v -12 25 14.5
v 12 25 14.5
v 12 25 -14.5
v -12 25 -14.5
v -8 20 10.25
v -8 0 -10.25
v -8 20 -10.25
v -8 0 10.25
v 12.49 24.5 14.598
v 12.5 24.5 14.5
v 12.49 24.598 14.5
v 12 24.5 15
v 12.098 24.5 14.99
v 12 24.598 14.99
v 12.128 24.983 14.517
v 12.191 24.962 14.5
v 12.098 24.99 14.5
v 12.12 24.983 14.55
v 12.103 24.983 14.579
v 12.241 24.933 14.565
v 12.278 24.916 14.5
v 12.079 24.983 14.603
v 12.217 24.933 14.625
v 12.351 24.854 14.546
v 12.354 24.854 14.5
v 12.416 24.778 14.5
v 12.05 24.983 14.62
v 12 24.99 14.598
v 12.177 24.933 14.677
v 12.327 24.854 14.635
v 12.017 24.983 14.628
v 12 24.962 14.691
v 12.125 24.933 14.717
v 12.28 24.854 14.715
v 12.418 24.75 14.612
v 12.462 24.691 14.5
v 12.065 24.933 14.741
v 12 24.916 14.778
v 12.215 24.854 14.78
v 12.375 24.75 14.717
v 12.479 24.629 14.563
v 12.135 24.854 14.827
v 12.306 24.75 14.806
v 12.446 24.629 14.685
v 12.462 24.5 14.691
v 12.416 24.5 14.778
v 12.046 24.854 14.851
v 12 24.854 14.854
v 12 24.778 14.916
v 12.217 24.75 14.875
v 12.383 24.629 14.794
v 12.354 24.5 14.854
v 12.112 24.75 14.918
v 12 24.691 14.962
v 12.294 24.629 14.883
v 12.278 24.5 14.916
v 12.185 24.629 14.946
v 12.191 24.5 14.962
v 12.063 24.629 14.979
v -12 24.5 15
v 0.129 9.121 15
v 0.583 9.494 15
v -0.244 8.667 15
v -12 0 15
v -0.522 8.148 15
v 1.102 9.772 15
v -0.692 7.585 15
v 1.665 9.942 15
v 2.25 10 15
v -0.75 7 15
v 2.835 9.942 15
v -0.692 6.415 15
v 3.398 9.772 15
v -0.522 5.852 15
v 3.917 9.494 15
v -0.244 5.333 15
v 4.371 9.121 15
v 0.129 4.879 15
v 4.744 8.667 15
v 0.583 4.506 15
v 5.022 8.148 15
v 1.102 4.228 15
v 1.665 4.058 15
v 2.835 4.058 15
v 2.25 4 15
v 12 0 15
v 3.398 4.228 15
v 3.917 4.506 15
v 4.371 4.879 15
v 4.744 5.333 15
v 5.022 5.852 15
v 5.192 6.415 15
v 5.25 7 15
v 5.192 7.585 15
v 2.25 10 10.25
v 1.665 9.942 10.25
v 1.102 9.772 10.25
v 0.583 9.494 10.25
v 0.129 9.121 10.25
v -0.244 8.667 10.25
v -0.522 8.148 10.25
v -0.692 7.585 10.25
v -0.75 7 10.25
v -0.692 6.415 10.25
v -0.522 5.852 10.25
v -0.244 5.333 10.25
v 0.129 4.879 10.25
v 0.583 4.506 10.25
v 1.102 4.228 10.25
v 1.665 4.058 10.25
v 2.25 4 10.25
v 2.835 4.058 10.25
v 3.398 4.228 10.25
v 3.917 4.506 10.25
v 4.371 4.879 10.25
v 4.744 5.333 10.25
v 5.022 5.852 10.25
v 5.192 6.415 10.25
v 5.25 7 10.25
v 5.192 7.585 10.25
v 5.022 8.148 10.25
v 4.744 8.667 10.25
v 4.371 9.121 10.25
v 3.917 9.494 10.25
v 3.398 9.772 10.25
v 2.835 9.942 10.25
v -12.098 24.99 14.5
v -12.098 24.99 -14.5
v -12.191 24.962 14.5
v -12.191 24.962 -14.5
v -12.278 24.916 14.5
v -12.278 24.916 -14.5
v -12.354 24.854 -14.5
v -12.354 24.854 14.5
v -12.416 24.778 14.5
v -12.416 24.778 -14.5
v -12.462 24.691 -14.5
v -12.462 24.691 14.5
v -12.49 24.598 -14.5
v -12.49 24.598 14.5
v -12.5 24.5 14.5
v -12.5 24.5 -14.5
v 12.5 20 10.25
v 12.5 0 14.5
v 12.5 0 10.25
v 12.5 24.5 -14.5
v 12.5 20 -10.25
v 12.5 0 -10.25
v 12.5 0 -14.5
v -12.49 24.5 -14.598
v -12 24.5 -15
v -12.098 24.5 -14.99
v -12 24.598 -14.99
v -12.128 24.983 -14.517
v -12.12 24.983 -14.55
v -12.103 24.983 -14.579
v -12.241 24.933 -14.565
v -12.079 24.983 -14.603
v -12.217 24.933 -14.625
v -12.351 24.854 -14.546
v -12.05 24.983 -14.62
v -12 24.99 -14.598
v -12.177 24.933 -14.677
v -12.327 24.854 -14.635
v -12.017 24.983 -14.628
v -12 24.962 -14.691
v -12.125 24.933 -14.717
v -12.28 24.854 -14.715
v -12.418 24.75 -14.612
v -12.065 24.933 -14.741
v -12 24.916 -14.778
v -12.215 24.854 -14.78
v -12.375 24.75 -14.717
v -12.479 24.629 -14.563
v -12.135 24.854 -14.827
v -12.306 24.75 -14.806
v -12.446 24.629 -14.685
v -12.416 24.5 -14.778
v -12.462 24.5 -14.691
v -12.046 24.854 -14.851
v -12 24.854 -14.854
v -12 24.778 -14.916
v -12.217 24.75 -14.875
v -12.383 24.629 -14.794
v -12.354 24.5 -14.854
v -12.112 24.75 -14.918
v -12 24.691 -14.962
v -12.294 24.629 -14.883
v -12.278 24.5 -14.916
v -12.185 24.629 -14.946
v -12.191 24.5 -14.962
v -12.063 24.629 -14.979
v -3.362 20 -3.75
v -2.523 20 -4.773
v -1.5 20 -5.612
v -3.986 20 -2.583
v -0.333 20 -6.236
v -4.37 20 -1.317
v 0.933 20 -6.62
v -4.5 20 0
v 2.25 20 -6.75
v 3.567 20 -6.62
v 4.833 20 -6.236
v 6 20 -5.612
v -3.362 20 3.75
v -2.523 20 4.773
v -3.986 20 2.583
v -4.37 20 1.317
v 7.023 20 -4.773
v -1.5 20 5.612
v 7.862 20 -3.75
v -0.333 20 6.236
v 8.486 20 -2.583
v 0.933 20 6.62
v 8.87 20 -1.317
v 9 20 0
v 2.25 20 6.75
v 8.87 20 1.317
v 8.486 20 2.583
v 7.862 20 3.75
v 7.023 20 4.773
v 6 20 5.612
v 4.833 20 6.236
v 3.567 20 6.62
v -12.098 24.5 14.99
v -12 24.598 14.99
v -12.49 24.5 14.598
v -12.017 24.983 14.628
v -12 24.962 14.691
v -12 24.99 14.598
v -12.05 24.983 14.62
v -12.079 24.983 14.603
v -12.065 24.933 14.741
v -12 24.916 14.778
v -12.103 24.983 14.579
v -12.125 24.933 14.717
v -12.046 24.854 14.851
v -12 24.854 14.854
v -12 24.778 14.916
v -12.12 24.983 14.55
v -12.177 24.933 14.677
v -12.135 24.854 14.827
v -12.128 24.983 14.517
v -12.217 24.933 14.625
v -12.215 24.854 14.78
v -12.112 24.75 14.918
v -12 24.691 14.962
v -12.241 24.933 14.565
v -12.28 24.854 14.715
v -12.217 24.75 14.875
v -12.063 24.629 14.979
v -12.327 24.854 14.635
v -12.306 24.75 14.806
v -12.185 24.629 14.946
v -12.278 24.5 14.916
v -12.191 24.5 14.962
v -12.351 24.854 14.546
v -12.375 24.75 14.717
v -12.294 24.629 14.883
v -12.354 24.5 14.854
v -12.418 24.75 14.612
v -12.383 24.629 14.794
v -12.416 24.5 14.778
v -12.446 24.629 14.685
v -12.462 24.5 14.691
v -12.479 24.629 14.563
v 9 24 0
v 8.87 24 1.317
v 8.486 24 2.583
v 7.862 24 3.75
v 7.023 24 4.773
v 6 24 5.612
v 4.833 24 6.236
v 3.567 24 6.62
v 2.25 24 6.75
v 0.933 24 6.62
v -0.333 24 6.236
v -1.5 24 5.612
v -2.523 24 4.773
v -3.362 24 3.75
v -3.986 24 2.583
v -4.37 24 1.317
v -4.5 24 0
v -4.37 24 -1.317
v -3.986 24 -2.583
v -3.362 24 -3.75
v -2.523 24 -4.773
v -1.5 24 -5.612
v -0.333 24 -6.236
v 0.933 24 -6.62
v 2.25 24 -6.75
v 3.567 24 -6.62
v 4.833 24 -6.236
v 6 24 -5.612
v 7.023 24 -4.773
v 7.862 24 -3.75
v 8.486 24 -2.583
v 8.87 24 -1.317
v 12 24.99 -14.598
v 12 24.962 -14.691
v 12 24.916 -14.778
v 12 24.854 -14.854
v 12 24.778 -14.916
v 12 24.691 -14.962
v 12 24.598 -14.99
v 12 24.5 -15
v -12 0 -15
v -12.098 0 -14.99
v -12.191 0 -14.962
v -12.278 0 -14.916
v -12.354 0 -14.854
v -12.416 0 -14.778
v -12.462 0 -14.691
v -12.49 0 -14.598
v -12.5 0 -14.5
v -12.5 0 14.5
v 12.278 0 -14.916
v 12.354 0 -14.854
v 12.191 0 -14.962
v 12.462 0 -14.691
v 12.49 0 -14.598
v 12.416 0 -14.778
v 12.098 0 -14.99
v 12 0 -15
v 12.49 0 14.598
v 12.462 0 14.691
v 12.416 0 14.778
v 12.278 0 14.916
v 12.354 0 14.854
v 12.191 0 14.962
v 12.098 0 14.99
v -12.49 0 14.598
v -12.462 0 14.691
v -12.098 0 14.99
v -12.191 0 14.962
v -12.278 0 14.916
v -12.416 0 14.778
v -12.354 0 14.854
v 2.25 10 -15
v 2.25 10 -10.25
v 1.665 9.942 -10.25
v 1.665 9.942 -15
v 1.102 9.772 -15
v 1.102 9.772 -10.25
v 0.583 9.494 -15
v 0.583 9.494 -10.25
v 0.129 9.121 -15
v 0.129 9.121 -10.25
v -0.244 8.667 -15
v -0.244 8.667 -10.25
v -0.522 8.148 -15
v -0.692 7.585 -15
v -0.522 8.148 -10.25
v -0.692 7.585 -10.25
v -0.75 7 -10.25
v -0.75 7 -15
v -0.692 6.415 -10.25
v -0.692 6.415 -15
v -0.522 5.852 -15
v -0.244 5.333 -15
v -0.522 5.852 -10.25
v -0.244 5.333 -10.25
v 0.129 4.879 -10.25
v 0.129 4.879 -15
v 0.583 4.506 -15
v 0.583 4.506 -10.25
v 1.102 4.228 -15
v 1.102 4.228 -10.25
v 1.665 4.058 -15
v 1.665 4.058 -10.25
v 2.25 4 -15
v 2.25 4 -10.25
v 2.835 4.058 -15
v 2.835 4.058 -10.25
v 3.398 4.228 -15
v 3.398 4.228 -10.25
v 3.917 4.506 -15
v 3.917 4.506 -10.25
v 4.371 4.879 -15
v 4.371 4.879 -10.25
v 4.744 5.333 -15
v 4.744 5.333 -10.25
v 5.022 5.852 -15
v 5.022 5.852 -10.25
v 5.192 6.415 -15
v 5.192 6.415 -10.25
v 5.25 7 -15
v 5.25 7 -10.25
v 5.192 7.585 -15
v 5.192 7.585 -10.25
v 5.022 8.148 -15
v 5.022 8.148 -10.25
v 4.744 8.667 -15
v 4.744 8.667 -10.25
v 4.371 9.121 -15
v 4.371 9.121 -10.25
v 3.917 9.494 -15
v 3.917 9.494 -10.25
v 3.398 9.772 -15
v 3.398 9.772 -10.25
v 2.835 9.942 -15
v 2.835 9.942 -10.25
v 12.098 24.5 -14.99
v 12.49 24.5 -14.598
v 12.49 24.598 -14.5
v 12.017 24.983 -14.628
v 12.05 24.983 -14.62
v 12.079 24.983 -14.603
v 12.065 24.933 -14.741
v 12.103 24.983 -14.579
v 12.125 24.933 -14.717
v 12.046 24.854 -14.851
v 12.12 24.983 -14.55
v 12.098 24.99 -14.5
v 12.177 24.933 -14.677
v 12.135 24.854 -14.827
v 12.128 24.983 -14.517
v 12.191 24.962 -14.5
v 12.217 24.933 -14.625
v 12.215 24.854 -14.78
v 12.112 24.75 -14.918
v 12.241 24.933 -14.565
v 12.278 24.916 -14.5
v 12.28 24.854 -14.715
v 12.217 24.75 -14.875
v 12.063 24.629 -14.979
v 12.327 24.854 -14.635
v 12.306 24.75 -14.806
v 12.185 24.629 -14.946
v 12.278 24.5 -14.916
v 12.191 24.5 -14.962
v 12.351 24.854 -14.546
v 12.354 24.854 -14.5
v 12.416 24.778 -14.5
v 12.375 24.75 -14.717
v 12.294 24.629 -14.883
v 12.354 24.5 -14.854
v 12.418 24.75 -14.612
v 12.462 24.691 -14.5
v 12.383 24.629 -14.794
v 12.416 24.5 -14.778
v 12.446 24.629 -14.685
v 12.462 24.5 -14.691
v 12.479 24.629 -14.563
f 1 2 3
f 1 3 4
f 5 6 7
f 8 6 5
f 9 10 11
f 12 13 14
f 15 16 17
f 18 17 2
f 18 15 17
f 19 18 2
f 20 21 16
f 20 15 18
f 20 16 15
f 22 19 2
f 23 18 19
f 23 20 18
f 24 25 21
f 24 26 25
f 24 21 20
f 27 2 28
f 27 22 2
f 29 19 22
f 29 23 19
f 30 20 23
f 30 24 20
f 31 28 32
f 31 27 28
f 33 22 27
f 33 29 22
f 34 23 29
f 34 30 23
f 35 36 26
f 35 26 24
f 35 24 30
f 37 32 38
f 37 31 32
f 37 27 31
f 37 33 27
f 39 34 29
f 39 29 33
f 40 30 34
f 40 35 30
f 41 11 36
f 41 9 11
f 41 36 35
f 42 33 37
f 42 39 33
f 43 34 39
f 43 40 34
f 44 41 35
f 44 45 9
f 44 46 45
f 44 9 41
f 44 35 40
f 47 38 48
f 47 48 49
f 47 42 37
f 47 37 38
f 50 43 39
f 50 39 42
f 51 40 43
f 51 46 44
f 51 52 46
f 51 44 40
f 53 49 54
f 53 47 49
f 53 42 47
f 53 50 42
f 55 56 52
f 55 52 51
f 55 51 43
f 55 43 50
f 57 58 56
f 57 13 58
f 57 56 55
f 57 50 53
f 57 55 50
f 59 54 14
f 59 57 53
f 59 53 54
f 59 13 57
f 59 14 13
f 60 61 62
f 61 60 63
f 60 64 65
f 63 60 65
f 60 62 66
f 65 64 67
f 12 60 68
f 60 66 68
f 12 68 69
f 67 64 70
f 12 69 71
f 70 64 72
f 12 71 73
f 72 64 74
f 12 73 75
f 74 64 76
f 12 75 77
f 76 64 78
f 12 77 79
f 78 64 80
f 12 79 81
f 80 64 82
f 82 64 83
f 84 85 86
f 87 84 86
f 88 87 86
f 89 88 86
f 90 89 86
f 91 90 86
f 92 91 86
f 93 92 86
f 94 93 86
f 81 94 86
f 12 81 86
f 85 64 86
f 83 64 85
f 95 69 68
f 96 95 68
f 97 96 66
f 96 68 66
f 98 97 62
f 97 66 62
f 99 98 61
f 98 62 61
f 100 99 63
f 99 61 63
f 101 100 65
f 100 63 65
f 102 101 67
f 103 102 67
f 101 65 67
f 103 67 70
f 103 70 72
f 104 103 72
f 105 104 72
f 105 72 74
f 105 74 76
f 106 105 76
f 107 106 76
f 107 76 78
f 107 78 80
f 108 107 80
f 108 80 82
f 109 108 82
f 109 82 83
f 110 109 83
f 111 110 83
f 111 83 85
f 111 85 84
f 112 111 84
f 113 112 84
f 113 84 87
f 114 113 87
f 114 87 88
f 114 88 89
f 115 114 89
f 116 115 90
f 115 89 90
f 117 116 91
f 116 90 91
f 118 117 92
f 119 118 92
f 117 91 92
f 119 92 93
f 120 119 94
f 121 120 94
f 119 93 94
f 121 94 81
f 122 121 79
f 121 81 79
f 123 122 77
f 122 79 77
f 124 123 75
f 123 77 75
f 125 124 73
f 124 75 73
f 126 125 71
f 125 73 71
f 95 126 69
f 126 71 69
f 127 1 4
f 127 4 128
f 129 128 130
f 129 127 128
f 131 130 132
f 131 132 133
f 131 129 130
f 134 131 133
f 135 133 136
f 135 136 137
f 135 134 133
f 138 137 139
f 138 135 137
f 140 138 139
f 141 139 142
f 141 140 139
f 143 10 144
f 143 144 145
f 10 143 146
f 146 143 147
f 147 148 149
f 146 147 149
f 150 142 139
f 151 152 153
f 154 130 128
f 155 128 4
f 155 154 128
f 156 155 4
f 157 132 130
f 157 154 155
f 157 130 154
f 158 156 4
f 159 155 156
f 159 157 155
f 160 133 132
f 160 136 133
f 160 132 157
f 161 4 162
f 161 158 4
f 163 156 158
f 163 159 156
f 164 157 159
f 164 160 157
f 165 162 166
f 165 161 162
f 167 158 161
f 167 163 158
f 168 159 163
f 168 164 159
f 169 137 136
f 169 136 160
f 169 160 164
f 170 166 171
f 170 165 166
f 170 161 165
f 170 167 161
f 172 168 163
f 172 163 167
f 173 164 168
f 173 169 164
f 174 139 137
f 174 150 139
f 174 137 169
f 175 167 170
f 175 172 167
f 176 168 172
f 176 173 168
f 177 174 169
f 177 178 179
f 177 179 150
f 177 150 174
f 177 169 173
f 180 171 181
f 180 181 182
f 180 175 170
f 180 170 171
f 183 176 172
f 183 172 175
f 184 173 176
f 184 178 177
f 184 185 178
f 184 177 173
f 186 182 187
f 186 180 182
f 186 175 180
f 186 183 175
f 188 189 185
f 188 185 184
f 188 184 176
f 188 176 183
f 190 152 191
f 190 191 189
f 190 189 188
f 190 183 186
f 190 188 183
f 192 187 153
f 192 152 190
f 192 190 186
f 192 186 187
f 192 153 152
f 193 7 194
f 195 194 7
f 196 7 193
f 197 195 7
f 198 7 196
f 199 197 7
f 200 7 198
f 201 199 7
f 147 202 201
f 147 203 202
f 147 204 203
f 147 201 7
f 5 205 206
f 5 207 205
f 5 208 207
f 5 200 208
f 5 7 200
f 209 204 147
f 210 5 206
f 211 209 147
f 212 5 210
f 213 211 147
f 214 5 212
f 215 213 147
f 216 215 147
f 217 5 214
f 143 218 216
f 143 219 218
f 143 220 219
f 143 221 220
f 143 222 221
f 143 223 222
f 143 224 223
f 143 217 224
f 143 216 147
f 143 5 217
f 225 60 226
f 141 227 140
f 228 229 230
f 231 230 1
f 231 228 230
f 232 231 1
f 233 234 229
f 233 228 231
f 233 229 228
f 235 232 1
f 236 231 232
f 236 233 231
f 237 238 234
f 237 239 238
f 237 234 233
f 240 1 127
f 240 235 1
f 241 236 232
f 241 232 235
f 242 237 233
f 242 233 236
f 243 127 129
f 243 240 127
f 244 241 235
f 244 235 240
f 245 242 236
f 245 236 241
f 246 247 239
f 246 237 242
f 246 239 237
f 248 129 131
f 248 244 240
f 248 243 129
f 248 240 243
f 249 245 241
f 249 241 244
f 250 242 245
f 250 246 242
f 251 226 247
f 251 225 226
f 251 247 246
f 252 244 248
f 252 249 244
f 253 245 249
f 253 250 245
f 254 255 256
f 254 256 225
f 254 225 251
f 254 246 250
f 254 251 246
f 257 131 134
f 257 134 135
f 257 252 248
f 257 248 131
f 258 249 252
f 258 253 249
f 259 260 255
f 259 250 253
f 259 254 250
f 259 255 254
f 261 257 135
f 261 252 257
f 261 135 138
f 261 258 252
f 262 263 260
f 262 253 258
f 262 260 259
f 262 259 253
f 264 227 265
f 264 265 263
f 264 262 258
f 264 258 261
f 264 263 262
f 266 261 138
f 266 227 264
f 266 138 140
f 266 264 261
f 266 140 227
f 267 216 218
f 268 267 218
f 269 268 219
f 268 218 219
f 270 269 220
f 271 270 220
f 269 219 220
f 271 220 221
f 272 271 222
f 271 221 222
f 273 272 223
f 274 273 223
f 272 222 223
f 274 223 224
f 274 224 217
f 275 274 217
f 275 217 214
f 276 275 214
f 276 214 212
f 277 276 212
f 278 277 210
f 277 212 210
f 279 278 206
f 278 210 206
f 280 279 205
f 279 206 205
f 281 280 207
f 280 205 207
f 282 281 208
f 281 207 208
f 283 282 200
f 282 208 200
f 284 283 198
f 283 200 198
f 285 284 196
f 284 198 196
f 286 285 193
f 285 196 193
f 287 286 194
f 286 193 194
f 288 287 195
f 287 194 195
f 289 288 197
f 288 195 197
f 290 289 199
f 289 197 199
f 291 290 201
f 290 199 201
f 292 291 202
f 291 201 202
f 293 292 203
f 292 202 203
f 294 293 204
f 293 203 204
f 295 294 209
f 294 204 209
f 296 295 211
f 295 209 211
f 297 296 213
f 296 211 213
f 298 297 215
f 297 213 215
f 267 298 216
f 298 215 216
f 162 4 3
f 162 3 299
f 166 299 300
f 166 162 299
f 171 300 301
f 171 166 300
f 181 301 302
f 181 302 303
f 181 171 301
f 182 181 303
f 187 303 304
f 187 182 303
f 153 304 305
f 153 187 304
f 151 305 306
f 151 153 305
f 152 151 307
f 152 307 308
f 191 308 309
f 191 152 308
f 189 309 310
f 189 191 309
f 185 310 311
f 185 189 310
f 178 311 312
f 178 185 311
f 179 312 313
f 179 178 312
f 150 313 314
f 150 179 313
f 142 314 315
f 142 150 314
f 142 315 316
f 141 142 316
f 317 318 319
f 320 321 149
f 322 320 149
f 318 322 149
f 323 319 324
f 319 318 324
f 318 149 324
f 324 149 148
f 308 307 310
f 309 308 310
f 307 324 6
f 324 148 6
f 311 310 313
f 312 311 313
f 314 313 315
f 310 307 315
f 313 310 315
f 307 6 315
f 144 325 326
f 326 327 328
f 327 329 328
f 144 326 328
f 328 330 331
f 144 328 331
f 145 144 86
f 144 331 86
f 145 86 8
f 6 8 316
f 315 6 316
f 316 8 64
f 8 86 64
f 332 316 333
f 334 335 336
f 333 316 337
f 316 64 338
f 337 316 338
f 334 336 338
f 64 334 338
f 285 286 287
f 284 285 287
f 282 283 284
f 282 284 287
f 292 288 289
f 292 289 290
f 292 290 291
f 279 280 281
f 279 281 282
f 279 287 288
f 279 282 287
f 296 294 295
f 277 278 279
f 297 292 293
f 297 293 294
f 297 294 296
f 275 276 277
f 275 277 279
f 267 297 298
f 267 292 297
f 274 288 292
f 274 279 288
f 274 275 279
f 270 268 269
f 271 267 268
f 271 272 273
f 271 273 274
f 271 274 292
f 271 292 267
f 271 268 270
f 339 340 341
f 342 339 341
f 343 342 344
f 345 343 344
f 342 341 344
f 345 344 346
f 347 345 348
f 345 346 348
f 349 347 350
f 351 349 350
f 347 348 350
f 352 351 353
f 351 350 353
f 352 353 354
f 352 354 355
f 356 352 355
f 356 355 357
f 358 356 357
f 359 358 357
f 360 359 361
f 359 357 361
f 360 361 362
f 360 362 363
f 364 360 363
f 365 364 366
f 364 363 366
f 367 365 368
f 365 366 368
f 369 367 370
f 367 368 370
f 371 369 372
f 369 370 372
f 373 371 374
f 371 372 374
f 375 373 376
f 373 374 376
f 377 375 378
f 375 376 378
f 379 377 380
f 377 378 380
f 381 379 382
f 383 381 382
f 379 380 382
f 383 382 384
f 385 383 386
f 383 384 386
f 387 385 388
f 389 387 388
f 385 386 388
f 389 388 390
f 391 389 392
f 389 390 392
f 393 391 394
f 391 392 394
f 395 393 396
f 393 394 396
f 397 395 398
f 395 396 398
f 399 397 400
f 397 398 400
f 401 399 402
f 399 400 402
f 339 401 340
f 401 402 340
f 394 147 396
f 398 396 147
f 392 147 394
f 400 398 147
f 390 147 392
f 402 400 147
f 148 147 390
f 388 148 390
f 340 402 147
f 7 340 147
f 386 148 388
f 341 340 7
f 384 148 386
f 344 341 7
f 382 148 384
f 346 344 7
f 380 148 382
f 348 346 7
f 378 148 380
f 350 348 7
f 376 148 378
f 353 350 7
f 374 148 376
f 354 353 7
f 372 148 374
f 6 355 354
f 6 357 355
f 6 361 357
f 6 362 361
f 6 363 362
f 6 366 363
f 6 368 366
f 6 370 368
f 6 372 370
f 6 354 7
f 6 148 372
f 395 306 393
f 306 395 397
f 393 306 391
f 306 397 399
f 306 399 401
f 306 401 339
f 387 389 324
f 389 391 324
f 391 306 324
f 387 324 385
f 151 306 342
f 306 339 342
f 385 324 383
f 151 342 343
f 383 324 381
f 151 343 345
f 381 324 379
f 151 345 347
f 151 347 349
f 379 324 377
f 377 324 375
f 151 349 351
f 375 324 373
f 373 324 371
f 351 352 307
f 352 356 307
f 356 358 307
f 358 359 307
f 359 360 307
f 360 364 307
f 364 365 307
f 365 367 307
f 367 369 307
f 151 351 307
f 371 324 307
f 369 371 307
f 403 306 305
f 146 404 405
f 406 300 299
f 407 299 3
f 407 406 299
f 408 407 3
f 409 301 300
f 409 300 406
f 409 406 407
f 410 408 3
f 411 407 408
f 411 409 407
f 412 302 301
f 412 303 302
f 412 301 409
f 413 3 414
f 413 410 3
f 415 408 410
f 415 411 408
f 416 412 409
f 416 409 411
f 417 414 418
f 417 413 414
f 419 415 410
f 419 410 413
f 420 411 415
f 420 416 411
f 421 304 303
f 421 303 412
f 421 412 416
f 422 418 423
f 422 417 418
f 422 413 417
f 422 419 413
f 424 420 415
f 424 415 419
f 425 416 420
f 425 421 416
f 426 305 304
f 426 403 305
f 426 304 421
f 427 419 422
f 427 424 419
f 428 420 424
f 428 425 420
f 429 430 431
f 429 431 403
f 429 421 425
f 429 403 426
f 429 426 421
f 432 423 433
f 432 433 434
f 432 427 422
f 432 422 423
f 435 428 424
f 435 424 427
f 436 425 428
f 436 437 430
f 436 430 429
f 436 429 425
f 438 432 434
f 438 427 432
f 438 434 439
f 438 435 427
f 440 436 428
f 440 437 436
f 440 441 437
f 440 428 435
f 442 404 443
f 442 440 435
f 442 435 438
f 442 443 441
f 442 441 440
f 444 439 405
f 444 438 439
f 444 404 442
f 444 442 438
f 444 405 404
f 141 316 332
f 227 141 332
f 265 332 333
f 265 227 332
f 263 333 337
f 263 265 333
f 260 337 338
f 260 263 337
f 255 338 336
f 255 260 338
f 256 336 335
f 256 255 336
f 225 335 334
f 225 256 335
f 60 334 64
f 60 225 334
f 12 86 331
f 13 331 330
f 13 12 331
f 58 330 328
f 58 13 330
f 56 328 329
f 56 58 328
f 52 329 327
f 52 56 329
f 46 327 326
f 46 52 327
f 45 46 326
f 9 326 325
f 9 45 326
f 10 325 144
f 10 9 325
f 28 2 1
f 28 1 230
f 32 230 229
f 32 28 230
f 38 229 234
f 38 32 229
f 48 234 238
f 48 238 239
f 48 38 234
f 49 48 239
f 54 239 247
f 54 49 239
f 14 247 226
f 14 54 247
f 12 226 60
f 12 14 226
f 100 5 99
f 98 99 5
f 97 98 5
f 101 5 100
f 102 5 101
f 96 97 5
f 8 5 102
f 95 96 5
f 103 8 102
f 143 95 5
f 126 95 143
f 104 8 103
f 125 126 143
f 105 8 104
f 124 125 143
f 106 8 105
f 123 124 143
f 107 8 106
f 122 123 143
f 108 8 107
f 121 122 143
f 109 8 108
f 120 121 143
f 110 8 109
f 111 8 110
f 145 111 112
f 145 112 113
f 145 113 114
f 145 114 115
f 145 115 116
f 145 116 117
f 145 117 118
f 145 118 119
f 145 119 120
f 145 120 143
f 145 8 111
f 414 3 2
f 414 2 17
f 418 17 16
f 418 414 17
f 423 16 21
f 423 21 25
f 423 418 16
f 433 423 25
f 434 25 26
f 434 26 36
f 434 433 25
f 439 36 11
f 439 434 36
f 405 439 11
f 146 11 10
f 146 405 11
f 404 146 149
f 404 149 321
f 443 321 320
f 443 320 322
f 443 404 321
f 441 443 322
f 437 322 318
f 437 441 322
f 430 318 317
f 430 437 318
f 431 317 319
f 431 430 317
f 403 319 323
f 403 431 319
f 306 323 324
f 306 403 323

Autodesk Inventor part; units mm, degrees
ref_plane "YZ Plane" through (0, 0, 0) normal (1, 0, 0) x (0, 1, 0)
ref_plane "XZ Plane" through (0, 0, 0) normal (0, 1, 0) x (-1, 0, 0)
ref_plane "XY Plane" through (0, 0, 0) normal (0, 0, 1) x (1, 0, 0)
sketch "スケッチ1" plane through (0, 0, 0) normal (0, 1, 0) x (-1, 0, 0)
  line L0 (-12.5, -15) -> (12.5, -15)
  line L1 (12.5, -15) -> (12.5, 15)
  line L2 (12.5, 15) -> (-12.5, 15)
  line L3 (-12.5, 15) -> (-12.5, -15)
  line L4 (-12.5, -15) -> (12.5, 15) construction
  line L5 (12.5, -15) -> (-12.5, 15) construction
  point P0 (0, 0)
  dimension "d0" = 25
  dimension "d1" = 30
extrude "押し出し1" add sketch "スケッチ1" along normal blind 25
sketch "スケッチ2" plane through (0, 0, 0) normal (0, -1, 0) x (1, 0, 0)
  line L0 (12.5, 15) -> (12.5, -15) projected
  line L1 (12.5, -10.25) -> (-8, -10.25)
  line L2 (-8, -10.25) -> (-8, 10.25)
  line L3 (-8, 10.25) -> (12.5, 10.25)
  line L4 (12.5, 10.25) -> (12.5, -10.25)
  line L5 (12.5, -15) -> (-12.5, -15) projected
  point P0 (0, 0)
  point P1 (12.5, 10.25)
  dimension "d4" = 20.5
  dimension "d5" = 20.5
  dimension "d22" = 10.25
extrude "押し出し2" cut sketch "スケッチ2" against normal blind 20
sketch "スケッチ4" plane through (12.5, 0, -15) normal (0, 0, -1) x (-1, 0, 0)
  line L0 (0, 0) -> (25, 0) projected
  line L1 (0, 0) -> (0, 25) projected
  point P0 (12.5, 0)
  point P1 (10.25, 7)
  dimension "d12" = 7
  dimension "d13" = 10.25
hole "穴1" at (2.25, 7, -15) direction (0, 0, 1) diameter 6 end through all
fillet "フィレット1" radius 0.5 8 edges at (12.5, 12.5, -15) (-12.5, 12.5, -15) (-12.5, 12.5, 15) (12.5, 12.5, 15) (12.5, 25, 0) (0, 25, -15) (-12.5, 25, 0) (0, 25, 15)
sketch "スケッチ5" plane through (0, 20, 0) normal (0, -1, 0) x (1, 0, 0)
  circle A0 centre (2.25, 0) radius 6.75
  line L0 (12.5, 10.25) -> (12.5, -10.25) projected
  line L1 (-8, 10.25) -> (12.5, 10.25) projected
  point P0 (0, 0)
  dimension "d24" = 13.5
  dimension "d25" = 10.25
  dimension "d26" = 10.25
extrude "押し出し4" cut sketch "スケッチ5" against normal blind 4
properties part number "baseA"
